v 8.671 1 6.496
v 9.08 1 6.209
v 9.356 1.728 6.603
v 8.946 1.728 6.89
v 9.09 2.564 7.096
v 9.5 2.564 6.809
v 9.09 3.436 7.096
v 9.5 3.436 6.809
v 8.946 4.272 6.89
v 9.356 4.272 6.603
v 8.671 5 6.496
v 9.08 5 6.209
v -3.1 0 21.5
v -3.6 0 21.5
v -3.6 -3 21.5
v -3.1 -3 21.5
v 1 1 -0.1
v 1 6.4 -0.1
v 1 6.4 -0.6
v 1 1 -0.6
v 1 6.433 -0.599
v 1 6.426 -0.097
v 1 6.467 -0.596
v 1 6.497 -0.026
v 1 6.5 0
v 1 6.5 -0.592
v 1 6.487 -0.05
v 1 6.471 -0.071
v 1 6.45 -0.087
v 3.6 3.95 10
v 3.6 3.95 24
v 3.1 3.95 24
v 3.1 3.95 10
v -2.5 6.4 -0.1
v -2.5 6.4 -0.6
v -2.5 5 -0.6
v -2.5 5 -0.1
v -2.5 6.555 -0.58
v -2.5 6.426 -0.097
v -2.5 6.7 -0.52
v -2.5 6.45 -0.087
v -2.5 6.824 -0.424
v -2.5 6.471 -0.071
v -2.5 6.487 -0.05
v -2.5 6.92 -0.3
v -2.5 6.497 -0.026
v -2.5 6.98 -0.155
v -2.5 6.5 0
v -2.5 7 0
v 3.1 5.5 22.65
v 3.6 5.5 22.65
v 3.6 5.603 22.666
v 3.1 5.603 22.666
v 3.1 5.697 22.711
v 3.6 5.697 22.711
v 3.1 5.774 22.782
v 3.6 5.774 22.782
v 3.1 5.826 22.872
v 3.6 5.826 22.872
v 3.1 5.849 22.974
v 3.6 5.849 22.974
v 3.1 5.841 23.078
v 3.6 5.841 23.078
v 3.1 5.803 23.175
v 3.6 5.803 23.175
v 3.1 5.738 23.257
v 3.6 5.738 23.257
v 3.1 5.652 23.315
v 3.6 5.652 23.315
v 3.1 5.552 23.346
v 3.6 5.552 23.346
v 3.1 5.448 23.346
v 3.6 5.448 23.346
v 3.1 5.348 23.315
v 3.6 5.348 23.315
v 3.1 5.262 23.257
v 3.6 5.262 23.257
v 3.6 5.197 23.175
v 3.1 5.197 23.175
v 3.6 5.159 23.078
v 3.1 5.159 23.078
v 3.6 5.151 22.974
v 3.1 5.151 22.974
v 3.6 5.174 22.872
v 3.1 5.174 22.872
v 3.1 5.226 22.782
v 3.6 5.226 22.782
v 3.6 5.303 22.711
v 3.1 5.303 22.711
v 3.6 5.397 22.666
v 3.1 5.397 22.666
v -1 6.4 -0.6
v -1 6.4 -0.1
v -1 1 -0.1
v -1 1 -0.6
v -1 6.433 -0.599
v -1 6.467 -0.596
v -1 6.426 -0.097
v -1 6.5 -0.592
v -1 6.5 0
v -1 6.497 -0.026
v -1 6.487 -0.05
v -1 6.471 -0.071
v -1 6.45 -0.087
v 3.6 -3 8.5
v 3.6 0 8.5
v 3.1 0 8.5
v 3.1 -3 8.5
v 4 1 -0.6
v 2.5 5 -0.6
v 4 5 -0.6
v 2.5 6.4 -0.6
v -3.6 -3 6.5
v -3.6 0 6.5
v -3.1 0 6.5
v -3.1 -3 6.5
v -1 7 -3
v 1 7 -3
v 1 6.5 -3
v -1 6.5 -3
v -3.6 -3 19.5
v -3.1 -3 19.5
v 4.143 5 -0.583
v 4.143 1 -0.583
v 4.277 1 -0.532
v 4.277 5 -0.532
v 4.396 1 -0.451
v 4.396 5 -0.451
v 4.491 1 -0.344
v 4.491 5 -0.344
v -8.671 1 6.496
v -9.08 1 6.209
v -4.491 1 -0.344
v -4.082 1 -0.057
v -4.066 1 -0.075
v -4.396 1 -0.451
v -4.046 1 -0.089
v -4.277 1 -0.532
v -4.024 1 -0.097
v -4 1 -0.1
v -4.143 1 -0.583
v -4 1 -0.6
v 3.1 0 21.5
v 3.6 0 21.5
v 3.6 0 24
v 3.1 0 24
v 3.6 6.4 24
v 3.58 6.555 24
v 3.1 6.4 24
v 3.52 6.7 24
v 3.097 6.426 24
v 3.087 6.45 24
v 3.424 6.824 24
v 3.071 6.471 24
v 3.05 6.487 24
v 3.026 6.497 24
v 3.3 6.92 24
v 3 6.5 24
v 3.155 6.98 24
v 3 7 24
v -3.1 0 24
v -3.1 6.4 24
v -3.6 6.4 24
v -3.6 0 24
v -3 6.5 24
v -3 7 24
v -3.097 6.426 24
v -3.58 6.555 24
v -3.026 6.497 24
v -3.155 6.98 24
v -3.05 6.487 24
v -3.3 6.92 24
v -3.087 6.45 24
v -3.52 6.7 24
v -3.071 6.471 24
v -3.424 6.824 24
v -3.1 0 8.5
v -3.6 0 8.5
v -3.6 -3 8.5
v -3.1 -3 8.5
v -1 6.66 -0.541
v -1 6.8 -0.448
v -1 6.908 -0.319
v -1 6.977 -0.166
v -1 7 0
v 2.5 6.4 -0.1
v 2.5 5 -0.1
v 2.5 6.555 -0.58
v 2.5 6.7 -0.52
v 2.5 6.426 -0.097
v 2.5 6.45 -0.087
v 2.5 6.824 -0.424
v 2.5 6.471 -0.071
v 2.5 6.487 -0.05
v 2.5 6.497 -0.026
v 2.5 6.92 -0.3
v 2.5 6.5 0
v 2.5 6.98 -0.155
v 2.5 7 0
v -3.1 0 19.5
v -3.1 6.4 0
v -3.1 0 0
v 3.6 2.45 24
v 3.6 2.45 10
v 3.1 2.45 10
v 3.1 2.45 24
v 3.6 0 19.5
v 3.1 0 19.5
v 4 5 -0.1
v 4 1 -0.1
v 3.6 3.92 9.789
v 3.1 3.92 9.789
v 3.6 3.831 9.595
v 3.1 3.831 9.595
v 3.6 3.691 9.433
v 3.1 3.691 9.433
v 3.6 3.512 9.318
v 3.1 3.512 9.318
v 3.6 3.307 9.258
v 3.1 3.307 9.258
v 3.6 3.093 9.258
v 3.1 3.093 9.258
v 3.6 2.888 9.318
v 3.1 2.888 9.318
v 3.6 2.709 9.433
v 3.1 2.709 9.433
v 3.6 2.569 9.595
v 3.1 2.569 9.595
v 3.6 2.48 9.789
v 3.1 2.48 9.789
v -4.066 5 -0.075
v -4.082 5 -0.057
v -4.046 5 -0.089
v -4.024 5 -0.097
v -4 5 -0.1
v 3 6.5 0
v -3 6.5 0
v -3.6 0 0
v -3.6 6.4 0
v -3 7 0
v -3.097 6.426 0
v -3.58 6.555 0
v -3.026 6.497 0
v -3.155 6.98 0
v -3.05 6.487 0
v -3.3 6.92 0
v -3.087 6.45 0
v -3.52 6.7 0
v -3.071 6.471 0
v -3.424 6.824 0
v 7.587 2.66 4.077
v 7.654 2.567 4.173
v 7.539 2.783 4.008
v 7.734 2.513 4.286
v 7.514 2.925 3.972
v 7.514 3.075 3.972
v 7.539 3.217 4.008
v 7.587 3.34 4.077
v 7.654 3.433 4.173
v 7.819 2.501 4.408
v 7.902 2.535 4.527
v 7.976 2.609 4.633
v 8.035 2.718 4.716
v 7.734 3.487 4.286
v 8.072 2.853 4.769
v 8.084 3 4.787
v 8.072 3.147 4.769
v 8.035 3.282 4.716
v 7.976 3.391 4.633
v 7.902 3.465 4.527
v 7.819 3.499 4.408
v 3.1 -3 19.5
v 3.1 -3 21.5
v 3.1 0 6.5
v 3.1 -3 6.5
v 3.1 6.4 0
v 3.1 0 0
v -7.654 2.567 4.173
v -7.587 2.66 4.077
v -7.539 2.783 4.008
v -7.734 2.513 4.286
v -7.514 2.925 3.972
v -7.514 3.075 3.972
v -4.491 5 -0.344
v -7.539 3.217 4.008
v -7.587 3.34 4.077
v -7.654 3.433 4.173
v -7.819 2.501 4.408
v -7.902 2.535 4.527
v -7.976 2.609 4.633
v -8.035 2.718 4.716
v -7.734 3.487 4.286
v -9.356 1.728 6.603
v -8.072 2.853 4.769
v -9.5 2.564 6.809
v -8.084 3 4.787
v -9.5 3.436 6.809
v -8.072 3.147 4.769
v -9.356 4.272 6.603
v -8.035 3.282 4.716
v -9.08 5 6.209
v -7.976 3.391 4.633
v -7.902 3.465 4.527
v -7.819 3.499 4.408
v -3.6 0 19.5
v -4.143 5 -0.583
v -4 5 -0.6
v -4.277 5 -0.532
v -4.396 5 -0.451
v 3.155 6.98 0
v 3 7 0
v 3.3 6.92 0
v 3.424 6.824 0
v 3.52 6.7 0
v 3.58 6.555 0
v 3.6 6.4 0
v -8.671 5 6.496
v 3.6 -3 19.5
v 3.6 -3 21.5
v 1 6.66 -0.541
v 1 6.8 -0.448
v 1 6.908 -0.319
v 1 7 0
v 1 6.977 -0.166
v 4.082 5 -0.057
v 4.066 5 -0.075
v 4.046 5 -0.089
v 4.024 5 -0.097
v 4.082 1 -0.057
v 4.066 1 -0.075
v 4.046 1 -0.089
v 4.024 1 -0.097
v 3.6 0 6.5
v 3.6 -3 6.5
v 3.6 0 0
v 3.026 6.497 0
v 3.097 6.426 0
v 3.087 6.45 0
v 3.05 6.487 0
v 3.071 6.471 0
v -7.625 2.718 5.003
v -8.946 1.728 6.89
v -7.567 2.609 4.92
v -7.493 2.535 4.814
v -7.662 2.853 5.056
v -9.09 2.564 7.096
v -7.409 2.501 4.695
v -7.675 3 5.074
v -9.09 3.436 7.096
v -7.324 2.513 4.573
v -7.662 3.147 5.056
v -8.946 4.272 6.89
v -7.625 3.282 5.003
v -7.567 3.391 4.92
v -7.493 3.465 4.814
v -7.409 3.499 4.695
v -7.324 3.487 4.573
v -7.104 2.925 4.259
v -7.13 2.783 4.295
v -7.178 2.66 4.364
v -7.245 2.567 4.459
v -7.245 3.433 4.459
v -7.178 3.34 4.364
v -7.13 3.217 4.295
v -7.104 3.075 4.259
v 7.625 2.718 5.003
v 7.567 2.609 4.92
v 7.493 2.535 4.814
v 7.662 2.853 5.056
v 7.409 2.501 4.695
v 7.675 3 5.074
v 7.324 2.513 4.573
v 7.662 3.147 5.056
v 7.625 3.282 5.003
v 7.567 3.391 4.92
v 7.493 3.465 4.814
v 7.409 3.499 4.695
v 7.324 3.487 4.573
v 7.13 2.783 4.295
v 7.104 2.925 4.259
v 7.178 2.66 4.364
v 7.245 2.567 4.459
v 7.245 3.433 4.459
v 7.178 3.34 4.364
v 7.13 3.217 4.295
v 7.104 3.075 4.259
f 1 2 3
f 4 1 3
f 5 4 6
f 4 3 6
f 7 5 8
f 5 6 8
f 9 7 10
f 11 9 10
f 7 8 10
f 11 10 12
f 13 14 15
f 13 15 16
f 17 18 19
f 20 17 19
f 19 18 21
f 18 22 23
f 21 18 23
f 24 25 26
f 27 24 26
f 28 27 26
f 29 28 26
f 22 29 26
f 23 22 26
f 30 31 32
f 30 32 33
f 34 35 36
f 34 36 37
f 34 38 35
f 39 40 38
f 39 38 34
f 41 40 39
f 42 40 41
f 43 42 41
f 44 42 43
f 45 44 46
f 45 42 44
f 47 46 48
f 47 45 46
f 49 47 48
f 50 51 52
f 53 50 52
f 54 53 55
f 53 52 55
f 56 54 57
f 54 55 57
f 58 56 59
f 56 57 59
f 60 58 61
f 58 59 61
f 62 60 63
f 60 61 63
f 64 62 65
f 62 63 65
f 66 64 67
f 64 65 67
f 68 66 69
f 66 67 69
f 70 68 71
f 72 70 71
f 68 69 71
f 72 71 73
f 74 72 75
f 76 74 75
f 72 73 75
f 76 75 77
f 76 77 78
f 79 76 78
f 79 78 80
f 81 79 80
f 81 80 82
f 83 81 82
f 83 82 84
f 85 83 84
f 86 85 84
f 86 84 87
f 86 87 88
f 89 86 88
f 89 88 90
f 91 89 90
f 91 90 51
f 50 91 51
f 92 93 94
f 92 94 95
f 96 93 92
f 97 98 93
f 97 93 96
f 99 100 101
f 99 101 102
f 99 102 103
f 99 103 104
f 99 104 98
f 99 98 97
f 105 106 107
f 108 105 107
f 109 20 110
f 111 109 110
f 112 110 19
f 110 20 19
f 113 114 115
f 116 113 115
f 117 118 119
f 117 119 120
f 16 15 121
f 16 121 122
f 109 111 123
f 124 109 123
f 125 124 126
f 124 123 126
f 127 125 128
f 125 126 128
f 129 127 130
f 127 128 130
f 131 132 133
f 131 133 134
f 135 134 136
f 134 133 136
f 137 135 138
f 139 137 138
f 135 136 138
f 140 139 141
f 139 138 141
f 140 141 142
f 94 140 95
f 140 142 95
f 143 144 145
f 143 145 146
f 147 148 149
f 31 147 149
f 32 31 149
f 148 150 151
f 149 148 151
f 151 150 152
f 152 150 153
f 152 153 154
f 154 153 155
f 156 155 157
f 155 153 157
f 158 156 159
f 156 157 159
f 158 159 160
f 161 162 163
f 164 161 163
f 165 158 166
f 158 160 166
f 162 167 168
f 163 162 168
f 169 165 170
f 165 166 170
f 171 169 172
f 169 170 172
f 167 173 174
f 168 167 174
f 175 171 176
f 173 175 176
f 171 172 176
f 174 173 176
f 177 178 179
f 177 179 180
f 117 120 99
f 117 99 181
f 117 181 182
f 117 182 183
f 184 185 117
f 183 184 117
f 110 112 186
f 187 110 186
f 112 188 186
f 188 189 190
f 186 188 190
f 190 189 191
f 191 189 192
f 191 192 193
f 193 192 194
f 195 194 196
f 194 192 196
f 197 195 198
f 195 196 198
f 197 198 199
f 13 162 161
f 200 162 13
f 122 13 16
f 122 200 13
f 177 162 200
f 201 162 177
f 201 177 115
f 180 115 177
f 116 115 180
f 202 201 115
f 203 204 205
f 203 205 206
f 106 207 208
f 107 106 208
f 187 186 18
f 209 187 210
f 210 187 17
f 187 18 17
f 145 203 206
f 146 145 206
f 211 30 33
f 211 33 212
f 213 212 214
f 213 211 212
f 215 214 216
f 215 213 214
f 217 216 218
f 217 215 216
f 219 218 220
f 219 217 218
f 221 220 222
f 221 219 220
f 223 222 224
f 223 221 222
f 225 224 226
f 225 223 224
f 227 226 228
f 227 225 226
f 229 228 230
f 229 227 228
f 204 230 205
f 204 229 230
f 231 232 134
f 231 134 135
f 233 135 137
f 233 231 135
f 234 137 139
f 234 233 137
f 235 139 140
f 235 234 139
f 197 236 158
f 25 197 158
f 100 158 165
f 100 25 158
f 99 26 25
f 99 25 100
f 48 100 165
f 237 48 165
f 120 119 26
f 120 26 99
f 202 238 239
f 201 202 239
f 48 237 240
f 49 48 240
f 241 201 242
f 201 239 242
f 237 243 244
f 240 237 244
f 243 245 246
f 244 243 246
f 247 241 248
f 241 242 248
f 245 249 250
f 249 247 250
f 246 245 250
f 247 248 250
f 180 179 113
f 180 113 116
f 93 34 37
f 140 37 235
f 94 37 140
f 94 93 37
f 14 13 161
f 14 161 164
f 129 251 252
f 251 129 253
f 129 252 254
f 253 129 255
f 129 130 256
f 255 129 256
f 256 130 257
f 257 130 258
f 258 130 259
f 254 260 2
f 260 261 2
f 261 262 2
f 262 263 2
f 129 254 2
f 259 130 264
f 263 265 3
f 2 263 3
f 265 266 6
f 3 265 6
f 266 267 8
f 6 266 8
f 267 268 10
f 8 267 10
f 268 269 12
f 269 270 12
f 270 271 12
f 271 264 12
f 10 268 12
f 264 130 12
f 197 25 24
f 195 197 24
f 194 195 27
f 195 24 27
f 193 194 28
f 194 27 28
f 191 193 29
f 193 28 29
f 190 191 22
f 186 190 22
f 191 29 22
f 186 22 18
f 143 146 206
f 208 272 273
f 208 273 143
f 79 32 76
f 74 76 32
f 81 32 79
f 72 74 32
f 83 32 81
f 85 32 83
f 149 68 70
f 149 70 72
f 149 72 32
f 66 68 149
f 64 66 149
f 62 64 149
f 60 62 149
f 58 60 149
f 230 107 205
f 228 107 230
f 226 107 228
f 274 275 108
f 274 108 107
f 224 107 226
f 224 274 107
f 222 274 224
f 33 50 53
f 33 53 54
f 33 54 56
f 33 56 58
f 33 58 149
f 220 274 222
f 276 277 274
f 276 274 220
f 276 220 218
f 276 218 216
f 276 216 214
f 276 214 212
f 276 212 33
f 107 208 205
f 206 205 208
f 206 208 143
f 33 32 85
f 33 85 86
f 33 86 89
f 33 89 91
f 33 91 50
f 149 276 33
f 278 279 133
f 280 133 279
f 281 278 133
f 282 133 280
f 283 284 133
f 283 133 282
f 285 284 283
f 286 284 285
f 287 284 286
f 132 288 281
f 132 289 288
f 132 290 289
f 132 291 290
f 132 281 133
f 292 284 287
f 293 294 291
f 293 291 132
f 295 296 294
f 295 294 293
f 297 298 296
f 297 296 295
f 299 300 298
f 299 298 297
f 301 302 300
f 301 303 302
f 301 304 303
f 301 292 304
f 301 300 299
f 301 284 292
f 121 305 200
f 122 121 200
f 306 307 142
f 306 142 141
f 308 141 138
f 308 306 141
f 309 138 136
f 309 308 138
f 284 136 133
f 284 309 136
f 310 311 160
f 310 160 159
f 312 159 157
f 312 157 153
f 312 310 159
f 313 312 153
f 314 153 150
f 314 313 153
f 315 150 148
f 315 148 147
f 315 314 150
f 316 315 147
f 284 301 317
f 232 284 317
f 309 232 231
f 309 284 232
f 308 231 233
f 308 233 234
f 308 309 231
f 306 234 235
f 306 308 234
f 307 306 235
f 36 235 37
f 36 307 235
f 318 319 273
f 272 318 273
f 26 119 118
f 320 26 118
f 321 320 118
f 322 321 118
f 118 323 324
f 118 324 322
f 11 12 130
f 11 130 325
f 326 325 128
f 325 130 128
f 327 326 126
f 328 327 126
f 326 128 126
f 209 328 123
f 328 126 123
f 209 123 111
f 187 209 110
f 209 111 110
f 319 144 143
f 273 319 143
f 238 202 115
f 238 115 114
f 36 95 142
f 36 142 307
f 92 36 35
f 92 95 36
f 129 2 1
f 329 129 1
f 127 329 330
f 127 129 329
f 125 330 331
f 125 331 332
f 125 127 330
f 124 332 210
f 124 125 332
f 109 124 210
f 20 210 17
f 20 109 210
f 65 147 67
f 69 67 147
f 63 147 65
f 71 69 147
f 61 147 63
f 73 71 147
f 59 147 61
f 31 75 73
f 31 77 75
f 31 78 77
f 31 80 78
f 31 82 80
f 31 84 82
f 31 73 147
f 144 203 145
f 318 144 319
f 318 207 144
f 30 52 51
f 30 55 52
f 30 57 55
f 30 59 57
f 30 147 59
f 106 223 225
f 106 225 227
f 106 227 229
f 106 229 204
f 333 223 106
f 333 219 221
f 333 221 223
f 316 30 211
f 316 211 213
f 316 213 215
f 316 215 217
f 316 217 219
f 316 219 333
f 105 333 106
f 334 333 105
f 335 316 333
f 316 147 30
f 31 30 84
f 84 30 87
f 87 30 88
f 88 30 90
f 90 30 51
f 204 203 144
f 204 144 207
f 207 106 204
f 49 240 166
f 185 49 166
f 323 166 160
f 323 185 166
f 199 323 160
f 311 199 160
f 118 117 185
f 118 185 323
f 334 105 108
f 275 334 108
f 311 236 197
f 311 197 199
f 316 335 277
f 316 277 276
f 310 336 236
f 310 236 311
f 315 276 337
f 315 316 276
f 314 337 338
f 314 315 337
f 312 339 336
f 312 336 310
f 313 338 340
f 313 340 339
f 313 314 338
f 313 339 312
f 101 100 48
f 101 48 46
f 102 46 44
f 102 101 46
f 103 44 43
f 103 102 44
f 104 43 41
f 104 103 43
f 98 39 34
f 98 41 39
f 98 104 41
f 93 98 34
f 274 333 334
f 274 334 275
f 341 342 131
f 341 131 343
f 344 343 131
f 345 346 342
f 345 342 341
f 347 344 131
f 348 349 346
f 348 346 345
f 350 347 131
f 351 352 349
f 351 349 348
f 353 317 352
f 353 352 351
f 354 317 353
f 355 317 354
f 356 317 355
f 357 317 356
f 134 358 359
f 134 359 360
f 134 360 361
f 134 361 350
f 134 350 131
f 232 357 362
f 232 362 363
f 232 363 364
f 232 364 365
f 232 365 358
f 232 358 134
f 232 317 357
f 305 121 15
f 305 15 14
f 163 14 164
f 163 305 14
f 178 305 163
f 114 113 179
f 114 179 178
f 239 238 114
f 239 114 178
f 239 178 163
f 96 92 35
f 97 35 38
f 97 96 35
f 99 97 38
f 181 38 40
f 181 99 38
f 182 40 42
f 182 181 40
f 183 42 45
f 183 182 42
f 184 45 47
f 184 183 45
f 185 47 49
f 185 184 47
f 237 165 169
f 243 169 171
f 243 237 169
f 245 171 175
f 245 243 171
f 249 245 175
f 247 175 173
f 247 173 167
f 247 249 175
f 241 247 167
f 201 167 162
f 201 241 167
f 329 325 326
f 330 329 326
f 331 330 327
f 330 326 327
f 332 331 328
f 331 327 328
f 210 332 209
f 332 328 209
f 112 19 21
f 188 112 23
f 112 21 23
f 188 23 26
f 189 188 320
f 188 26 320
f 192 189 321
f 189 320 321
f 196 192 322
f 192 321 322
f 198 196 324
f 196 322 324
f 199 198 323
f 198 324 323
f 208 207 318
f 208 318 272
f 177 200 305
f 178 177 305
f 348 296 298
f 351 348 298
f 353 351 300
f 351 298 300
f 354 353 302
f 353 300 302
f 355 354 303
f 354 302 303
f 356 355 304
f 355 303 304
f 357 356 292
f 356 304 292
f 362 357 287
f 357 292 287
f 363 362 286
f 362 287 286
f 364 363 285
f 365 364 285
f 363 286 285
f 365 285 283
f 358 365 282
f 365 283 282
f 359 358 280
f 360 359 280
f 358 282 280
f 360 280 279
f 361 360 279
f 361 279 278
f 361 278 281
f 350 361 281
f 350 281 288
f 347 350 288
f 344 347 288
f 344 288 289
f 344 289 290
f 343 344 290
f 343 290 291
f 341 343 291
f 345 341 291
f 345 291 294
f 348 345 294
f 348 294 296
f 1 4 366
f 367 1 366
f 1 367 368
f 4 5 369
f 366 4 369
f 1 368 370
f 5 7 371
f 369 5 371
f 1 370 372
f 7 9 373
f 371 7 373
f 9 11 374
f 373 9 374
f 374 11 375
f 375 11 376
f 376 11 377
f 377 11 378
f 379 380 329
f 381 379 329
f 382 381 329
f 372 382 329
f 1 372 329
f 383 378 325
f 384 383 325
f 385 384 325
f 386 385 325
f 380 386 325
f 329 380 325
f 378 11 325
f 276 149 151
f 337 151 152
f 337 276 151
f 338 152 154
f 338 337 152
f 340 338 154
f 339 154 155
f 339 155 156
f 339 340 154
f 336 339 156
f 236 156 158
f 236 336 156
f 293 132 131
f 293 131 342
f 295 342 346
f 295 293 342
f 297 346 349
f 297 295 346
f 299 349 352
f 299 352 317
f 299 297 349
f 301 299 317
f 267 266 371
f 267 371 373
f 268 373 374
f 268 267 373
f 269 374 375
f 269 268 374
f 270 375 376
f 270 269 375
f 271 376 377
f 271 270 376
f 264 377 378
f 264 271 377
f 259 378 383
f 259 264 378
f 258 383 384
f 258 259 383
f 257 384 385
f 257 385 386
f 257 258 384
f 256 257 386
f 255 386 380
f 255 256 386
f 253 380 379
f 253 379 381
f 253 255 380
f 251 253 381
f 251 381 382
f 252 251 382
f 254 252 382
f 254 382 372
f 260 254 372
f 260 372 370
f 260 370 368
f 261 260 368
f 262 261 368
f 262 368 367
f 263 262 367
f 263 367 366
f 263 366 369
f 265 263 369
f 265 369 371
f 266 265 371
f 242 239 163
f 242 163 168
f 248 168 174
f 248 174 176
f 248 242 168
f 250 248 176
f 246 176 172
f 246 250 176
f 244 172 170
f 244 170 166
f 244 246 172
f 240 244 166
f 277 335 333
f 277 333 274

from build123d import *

# Parameters (mm, degrees)
BOSS_EXTRU_1_DEPTH      = 24
ESQUISSE2_W             = 2
ESQUISSE2_H             = 0.5
BOSS_EXTRU_2_DEPTH      = 3
BOSS_EXTRU_3_DEPTH      = 3
ESQUISSE6_W             = 0.6
ESQUISSE6_H             = 2
ENL_V_MAT_EXTRU_1_DEPTH = 1.5
BOSS_EXTRU_4_DEPTH      = 4
ENL_V_MAT_EXTRU_3_REACH = 29.975
ESQUISSE8_R             = 0.5
ESQUISSE9_W             = 0.5
ESQUISSE9_H             = 2
BOSS_EXTRU_5_DEPTH      = 3
ENL_V_MAT_EXTRU_2_REACH = 30.233
ESQUISSE7_R             = 0.35


with BuildPart() as part:
    # Esquisse1 → Boss.-Extru.1 (new body)
    with BuildSketch(Plane.XY):
        with BuildLine():
            Line((-3, 7), (3, 7))
            ThreePointArc((3, 7), (3.424264069, 6.824264069), (3.6, 6.4))
            Line((3.6, 6.4), (3.6, 0))
            Line((3.6, 0), (3.1, 0))
            Line((3.1, 0), (3.1, 6.4))
            ThreePointArc((3.1, 6.4), (3.070710678, 6.470710678), (3, 6.5))
            Line((3, 6.5), (-3, 6.5))
            ThreePointArc((-3, 6.5), (-3.070710678, 6.470710678), (-3.1, 6.4))
            Line((-3.1, 6.4), (-3.1, 0))
            Line((-3.1, 0), (-3.6, 0))
            Line((-3.6, 0), (-3.6, 6.4))
            ThreePointArc((-3.6, 6.4), (-3.424264069, 6.824264069), (-3, 7))
        make_face()
    extrude(amount=BOSS_EXTRU_1_DEPTH)

    # Esquisse2 → Boss.-Extru.2 (add)
    with BuildSketch(Plane(origin=(0, 0, 0), x_dir=(-1, 0, 0), z_dir=(0, 0, -1))):
        with Locations((0, 6.75)):
            Rectangle(ESQUISSE2_W, ESQUISSE2_H)
    extrude(amount=BOSS_EXTRU_2_DEPTH)

    # Esquisse5 → Boss.-Extru.3 (add)
    with BuildSketch(Plane.ZY.offset(1)):
        with BuildLine():
            Line((-0.1, 1), (-0.6, 1))
            Line((-0.6, 1), (-0.6, 6.4))
            ThreePointArc((-0.6, 6.4), (-0.424264069, 6.824264069), (0, 7))
            Line((0, 7), (0, 6.5))
            ThreePointArc((0, 6.5), (-0.070710678, 6.470710678), (-0.1, 6.4))
            Line((-0.1, 6.4), (-0.1, 1))
        make_face()
    boss_extru_3 = extrude(amount=BOSS_EXTRU_3_DEPTH)

    # Esquisse6 → Enlèv. mat.-Extru.1 (cut)
    with BuildSketch(Plane.ZY.offset(4)):
        with Locations((-0.3, 6)):
            Rectangle(ESQUISSE6_W, ESQUISSE6_H)
    enl_v_mat_extru_1 = extrude(amount=-ENL_V_MAT_EXTRU_1_DEPTH, mode=Mode.SUBTRACT)

    # Esquisse3 → Boss.-Extru.4 (add)
    with BuildSketch(Plane(origin=(0, 5, 0), x_dir=(1, 0, 0), z_dir=(0, 1, 0))):
        with BuildLine():
            Line((-4.491491227, 0.344145862), (-9.653679154, -7.028222537))
            Line((-9.653679154, -7.028222537), (-9.244103132, -7.315010755))
            Line((-9.244103132, -7.315010755), (-4.081915204, 0.057357644))
            ThreePointArc((-4.081915204, 0.057357644), (-4.046174861, 0.088701083), (-4, 0.1))
            Line((-4, 0.1), (-4, 0.6))
            ThreePointArc((-4, 0.6), (-4.277049168, 0.5322065), (-4.491491227, 0.344145862))
        make_face()
    boss_extru_4 = extrude(amount=-BOSS_EXTRU_4_DEPTH)

    # Esquisse8 → Enlèv. mat.-Extru.3 (cut, up to next)
    with BuildSketch(Plane(origin=(-3.175531513, 0, -2.223531103), x_dir=(-0.5735764363510417, 0, 0.8191520442889949), z_dir=(-0.819152044288995, 0, -0.5735764363510417)), mode=Mode.PRIVATE) as enl_v_mat_extru_3_sk1:
        with Locations((8.058237768, 3)):
            Circle(ESQUISSE8_R)
    enl_v_mat_extru_3_tool1 = extrude(enl_v_mat_extru_3_sk1.sketch, amount=-ENL_V_MAT_EXTRU_3_REACH, mode=Mode.PRIVATE) & part.part
    # Esquisse8 → Enlèv. mat.-Extru.3 (cut, up to next)
    with BuildSketch(Plane(origin=(-3.175531513, 0, -2.223531103), x_dir=(-0.5735764363510417, 0, 0.8191520442889949), z_dir=(-0.819152044288995, 0, -0.5735764363510417)), mode=Mode.PRIVATE) as enl_v_mat_extru_3_sk2:
        with BuildLine():
            Line((11.294305745, 1), (10.294305745, 1))
            ThreePointArc((10.294305745, 1), (11.058237768, 3), (10.294305745, 5))
            Line((10.294305745, 5), (11.294305745, 5))
            Line((11.294305745, 5), (11.294305745, 1))
        make_face()
    enl_v_mat_extru_3_tool2 = extrude(enl_v_mat_extru_3_sk2.sketch, amount=-ENL_V_MAT_EXTRU_3_REACH, mode=Mode.PRIVATE) & part.part
    enl_v_mat_extru_3_1 = enl_v_mat_extru_3_tool1.solids().sort_by_distance((-7.797547, 3, 4.377391))[0]
    add(enl_v_mat_extru_3_1, mode=Mode.SUBTRACT)
    enl_v_mat_extru_3_2 = enl_v_mat_extru_3_tool2.solids().sort_by_distance((-9.541925, 3, 6.868621))[0]
    add(enl_v_mat_extru_3_2, mode=Mode.SUBTRACT)
    enl_v_mat_extru_3 = enl_v_mat_extru_3_1 + enl_v_mat_extru_3_2  # Enlèv. mat.-Extru.3 as one shape, for the pattern or mirror that repeats it

    # Esquisse9 → Boss.-Extru.5 (add)
    with BuildSketch(Plane.XZ):
        with Locations((-3.35, 7.5)):
            Rectangle(ESQUISSE9_W, ESQUISSE9_H)
        with Locations((-3.35, 20.5)):
            Rectangle(ESQUISSE9_W, ESQUISSE9_H)
    boss_extru_5 = extrude(amount=BOSS_EXTRU_5_DEPTH)

    # Symétrie1: Boss.-Extru.3, Enlèv. mat.-Extru.1, Boss.-Extru.4, Enlèv. mat.-Extru.3, Boss.-Extru.5 across plane
    add(boss_extru_3.mirror(Plane(origin=(0, 0, 0), x_dir=(0, 0, 1), z_dir=(1, 0, 0))))
    add(enl_v_mat_extru_1.mirror(Plane(origin=(0, 0, 0), x_dir=(0, 0, 1), z_dir=(1, 0, 0))), mode=Mode.SUBTRACT)
    add(boss_extru_4.mirror(Plane(origin=(0, 0, 0), x_dir=(0, 0, 1), z_dir=(1, 0, 0))))
    add(enl_v_mat_extru_3.mirror(Plane(origin=(0, 0, 0), x_dir=(0, 0, 1), z_dir=(1, 0, 0))), mode=Mode.SUBTRACT)
    add(boss_extru_5.mirror(Plane(origin=(0, 0, 0), x_dir=(0, 0, 1), z_dir=(1, 0, 0))))

    # Esquisse7 → Enlèv. mat.-Extru.2 (cut, up to next)
    with BuildSketch(Plane(origin=(3.6, 0, 0), x_dir=(0, 0, -1), z_dir=(1, 0, 0)), mode=Mode.PRIVATE) as enl_v_mat_extru_2_sk1:
        with Locations((-23, 5.5)):
            Circle(ESQUISSE7_R)
    enl_v_mat_extru_2_tool1 = extrude(enl_v_mat_extru_2_sk1.sketch, amount=-ENL_V_MAT_EXTRU_2_REACH, mode=Mode.PRIVATE) & part.part
    # Esquisse7 → Enlèv. mat.-Extru.2 (cut, up to next)
    with BuildSketch(Plane(origin=(3.6, 0, 0), x_dir=(0, 0, -1), z_dir=(1, 0, 0)), mode=Mode.PRIVATE) as enl_v_mat_extru_2_sk2:
        with BuildLine():
            Line((-24, 3.95), (-10, 3.95))
            ThreePointArc((-10, 3.95), (-9.25, 3.2), (-10, 2.45))
            Line((-10, 2.45), (-24, 2.45))
            Line((-24, 2.45), (-24, 3.95))
        make_face()
    enl_v_mat_extru_2_tool2 = extrude(enl_v_mat_extru_2_sk2.sketch, amount=-ENL_V_MAT_EXTRU_2_REACH, mode=Mode.PRIVATE) & part.part
    add(enl_v_mat_extru_2_tool1.solids().sort_by_distance((3.6, 5.5, 23))[0], mode=Mode.SUBTRACT)
    add(enl_v_mat_extru_2_tool2.solids().sort_by_distance((3.6, 3.2, 16.704515))[0], mode=Mode.SUBTRACT)


solid = part.part
